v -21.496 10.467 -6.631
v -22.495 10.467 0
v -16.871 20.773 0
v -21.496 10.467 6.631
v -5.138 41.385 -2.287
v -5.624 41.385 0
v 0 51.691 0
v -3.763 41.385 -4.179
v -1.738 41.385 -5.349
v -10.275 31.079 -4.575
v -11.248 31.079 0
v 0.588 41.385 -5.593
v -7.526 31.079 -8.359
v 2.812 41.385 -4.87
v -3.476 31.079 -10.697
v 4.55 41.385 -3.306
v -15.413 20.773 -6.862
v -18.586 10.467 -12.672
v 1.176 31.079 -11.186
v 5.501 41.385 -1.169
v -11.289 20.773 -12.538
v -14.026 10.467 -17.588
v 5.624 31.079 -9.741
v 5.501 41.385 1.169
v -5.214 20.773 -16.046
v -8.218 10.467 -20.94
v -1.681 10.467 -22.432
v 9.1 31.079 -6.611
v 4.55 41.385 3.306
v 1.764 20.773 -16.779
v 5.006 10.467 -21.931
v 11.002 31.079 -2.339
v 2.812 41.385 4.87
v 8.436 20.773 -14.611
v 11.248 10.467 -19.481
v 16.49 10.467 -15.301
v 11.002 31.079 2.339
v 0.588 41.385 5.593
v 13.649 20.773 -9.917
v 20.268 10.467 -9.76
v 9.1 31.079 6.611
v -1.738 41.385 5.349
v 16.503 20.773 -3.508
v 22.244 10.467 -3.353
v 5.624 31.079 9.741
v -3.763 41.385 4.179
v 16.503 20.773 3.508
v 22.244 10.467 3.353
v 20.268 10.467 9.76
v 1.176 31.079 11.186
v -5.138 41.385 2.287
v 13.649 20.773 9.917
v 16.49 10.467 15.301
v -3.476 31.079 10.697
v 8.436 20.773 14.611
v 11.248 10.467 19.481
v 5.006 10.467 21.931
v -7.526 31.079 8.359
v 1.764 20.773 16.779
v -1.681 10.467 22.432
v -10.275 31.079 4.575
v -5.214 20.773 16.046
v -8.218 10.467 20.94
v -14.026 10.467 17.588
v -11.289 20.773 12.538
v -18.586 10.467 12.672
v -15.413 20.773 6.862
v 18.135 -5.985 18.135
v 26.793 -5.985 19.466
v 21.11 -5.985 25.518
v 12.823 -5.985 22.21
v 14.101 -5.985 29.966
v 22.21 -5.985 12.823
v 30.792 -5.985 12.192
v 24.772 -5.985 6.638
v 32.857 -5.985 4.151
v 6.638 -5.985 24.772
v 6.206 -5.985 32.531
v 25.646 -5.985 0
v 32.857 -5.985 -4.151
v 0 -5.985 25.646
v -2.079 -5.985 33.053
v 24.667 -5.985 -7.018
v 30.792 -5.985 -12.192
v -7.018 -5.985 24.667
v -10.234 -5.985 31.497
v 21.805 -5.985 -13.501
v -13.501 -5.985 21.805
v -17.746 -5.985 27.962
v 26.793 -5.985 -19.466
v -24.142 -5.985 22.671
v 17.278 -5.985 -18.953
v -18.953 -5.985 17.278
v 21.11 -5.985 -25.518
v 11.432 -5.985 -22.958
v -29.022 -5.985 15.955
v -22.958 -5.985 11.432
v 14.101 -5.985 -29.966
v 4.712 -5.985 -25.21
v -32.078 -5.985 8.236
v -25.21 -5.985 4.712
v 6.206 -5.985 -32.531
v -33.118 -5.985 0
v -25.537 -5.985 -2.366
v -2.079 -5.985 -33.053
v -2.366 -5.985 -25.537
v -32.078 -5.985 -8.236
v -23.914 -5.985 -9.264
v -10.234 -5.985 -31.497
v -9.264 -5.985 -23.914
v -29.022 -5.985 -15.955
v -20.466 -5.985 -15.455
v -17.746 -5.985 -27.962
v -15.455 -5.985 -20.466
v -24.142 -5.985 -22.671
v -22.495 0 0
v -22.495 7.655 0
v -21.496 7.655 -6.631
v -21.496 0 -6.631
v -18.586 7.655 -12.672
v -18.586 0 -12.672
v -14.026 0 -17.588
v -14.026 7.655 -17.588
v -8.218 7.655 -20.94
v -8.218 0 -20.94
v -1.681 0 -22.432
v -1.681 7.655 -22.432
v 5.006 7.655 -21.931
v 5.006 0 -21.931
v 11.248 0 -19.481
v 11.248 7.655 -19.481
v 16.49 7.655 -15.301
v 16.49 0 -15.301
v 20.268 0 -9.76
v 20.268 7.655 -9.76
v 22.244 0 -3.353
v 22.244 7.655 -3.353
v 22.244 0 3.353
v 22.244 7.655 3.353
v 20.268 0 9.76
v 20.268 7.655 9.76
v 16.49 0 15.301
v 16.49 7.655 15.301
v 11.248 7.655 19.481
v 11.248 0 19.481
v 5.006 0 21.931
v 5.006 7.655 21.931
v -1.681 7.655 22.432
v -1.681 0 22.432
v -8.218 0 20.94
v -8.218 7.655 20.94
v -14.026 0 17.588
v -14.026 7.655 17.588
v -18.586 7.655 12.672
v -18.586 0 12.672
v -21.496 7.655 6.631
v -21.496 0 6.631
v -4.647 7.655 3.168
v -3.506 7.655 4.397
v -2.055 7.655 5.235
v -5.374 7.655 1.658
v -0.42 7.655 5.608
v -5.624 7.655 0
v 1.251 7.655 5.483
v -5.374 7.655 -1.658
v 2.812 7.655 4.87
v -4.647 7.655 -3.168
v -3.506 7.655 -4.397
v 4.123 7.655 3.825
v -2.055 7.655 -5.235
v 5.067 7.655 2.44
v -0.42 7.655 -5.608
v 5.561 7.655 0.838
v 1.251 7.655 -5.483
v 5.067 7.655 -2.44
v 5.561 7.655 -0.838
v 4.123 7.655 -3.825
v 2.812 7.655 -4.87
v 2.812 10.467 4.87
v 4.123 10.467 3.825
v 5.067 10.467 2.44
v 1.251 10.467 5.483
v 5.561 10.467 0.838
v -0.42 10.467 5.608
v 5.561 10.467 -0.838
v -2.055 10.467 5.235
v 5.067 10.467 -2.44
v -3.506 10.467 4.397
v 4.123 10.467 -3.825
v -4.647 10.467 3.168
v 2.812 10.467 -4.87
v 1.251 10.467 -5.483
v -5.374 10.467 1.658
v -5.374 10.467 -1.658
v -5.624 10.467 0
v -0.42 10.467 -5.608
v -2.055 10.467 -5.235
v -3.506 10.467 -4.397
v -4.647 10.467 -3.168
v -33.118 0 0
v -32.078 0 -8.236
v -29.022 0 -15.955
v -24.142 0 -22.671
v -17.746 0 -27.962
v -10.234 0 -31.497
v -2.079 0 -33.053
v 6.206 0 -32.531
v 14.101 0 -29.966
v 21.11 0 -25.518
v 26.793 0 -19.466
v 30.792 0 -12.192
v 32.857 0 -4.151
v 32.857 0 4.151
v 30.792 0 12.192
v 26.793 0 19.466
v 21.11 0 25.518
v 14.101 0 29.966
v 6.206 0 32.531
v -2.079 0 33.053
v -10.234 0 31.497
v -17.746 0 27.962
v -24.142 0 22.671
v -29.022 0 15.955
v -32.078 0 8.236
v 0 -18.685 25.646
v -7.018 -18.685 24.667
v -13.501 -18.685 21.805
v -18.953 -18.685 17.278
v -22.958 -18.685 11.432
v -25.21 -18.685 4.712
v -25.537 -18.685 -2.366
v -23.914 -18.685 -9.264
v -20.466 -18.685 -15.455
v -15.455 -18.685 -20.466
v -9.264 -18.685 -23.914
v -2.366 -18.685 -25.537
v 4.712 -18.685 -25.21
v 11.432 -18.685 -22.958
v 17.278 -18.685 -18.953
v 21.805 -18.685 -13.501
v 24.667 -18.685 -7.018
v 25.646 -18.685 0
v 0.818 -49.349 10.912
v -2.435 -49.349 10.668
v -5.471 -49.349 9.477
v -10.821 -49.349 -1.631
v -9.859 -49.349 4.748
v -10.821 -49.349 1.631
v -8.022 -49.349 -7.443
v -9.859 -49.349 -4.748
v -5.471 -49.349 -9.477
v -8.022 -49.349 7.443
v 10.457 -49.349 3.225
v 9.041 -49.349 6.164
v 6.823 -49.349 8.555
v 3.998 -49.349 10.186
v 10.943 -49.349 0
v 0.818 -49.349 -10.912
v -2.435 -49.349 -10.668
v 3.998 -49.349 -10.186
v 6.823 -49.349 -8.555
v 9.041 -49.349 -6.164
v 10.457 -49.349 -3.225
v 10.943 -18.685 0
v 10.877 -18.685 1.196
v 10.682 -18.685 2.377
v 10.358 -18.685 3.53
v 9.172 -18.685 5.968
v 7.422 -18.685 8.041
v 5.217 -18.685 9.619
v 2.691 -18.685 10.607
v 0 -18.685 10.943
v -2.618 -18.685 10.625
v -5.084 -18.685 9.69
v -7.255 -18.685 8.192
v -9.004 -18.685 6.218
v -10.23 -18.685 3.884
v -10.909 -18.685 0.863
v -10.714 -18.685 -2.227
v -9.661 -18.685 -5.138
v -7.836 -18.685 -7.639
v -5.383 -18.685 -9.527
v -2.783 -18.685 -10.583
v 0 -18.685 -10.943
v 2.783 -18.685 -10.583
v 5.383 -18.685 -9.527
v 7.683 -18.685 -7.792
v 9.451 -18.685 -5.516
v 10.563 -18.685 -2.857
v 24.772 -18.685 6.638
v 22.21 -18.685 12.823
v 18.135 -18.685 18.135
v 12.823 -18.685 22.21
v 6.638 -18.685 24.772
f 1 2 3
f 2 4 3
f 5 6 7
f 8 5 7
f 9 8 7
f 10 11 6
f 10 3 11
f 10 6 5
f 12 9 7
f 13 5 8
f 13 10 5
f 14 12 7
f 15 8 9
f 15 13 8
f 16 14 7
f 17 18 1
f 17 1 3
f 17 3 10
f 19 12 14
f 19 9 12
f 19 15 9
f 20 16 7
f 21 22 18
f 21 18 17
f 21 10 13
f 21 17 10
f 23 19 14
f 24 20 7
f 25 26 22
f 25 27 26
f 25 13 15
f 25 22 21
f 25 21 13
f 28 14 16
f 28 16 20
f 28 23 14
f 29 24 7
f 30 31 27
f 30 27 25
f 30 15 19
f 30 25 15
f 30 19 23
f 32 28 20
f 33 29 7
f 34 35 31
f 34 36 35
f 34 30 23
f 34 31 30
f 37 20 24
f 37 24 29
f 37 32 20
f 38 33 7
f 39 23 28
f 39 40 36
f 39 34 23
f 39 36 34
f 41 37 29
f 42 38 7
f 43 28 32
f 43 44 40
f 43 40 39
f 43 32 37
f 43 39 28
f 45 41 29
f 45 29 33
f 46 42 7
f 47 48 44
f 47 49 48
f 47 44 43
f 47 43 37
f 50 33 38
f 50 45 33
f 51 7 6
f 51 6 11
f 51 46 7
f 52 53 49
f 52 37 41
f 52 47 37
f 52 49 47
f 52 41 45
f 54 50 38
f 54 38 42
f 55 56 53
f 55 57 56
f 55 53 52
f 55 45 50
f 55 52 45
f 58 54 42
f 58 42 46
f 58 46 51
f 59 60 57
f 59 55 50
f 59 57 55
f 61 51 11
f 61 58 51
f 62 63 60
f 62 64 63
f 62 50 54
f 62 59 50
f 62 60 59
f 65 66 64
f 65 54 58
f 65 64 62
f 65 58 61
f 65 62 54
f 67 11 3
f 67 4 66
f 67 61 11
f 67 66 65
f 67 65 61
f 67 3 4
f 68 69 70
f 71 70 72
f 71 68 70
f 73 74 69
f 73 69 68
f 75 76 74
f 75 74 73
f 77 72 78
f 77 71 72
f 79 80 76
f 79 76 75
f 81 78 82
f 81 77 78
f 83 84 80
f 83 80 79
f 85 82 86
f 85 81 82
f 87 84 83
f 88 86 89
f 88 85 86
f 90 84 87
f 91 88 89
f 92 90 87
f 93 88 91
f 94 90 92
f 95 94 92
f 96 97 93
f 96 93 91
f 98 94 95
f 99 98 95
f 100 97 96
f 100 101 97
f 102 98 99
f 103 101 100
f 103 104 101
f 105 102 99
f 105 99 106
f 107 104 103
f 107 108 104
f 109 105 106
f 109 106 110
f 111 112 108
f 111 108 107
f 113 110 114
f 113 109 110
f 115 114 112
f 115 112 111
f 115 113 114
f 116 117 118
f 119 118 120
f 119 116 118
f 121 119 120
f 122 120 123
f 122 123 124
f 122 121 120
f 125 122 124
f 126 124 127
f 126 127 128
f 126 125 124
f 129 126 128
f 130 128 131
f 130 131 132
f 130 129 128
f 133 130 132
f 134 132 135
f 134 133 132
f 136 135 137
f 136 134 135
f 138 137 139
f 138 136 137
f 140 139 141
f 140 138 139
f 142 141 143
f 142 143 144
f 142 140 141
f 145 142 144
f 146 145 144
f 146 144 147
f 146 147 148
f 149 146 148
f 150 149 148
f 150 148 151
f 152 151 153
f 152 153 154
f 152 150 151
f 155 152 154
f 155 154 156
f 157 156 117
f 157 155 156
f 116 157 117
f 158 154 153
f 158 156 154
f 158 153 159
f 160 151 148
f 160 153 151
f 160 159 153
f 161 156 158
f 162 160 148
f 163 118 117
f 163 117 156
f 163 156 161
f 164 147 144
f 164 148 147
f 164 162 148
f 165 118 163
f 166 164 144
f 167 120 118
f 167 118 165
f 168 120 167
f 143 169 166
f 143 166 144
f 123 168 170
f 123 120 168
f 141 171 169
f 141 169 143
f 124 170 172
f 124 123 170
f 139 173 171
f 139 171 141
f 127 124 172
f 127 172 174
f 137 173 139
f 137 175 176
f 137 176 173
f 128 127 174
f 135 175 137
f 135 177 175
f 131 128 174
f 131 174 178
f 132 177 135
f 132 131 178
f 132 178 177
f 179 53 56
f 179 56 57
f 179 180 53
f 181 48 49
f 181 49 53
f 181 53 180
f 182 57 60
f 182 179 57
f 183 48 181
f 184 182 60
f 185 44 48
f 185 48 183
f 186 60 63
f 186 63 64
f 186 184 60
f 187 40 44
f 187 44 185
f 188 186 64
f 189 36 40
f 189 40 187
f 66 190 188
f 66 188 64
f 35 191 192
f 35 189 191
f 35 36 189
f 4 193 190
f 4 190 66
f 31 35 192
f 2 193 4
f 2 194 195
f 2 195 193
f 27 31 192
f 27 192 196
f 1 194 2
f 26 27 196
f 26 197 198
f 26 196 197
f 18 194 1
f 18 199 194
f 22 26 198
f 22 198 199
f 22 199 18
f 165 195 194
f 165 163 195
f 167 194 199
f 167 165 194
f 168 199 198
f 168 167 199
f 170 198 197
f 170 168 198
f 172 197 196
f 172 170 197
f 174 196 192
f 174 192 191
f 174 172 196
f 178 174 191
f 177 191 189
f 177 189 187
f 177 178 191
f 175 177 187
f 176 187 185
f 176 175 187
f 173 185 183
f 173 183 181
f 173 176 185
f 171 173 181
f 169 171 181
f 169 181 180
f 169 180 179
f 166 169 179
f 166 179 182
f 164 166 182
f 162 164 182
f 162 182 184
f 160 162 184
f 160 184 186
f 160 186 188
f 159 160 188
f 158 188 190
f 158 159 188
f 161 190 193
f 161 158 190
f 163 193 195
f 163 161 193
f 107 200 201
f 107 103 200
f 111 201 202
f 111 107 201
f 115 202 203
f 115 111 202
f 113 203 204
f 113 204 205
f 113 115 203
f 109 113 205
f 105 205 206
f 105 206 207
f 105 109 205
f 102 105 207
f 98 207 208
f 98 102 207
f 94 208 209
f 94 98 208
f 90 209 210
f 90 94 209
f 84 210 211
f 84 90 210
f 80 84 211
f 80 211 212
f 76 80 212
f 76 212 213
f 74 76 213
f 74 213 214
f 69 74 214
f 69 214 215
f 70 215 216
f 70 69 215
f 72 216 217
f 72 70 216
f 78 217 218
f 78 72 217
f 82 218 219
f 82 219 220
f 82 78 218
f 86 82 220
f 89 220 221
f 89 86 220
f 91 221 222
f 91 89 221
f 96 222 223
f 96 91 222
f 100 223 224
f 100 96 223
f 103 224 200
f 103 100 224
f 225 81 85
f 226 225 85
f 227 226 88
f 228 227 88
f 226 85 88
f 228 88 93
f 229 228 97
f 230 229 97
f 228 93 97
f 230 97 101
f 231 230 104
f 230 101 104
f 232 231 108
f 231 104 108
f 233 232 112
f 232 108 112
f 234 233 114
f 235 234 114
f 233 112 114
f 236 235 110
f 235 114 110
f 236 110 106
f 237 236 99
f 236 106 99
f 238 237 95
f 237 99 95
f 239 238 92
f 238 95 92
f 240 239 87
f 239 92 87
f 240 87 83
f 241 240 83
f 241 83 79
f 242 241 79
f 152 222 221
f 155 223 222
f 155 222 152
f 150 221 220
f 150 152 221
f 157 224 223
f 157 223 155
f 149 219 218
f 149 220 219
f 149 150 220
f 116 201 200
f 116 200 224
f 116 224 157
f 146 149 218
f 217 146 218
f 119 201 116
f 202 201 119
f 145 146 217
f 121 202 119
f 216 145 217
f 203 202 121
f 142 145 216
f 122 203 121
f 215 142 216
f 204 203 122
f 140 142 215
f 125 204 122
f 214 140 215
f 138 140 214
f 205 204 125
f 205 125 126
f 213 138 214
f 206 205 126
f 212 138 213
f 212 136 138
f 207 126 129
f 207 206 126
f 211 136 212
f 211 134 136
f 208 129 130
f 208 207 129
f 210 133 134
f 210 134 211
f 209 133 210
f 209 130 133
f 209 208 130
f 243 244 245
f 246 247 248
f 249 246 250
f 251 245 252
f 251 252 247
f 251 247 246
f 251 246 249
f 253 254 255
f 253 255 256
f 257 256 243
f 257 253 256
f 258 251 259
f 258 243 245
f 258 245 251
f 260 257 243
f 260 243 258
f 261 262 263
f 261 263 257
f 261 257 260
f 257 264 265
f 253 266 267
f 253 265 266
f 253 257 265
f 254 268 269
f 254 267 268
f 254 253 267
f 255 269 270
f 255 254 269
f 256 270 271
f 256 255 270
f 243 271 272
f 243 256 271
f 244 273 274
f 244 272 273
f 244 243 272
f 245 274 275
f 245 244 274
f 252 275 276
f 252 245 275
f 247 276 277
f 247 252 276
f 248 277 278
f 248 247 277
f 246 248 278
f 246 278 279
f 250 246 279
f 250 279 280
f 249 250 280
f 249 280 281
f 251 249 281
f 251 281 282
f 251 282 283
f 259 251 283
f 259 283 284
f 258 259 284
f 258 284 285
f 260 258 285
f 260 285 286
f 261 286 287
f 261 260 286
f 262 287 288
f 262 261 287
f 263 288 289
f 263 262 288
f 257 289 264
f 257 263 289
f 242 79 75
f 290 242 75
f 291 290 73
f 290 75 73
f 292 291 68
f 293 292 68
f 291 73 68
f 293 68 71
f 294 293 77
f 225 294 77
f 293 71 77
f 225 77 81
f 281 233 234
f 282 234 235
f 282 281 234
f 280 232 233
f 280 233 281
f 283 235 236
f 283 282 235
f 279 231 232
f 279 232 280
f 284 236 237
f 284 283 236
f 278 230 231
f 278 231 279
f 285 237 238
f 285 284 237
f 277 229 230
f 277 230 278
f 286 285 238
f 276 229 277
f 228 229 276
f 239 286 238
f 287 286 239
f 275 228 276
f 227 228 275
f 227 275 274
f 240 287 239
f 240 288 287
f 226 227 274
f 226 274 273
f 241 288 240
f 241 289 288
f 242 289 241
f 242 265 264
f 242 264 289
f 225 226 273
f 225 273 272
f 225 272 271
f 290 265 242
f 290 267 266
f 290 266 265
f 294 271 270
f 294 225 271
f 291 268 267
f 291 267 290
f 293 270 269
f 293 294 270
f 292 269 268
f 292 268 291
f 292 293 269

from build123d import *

# Parameters (mm, degrees)
F2_R     = 10.9427513267
F6_DEPTH = 12.7


# Not quite as in the source:
# - a feature of the source that left no trace in its solid (it failed there, or was rolled back) is left out


with BuildPart() as f1:
    # F0 (on Top) → F1 (revolve)
    with BuildSketch(Plane.XY):
        Polygon((-22.4952585995, 7.654638961), (-22.4952585995, 0), (0, 0), (0, 51.6905076802), (-22.4952585995, 10.4665467516), (-5.6238141842, 10.4665467516), (-5.6238141842, 7.654638961), align=None)
        Polygon((-22.4952585995, 0), (-33.1180207431, 0), (-33.1180207431, -5.9848567471), (0, -5.9848567471), (0, 0), align=None)
    revolve(axis=Axis((0, -2.9924283735, 0), (0, -1, 0)))

    # F4: sweep along a path in F3
    with BuildLine(Plane.XY) as f4_path:
        Line((0, -6.7567974329), (0, -50.1213520765))
    # F2 (on face) → F4 (sweep)
    with BuildSketch(Plane.XZ.offset(5.9848567471)):
        Circle(F2_R)
    sweep(path=f4_path.line)

    # F5 (on face) → F6 (join)
    with BuildSketch(Plane.XZ.offset(5.9848567471)):
        with BuildLine():
            ThreePointArc((0, 25.6462656645), (-18.1346483635, -18.1346483635), (25.6462656645, 0))
            ThreePointArc((25.6462656645, 0), (18.1346483635, 18.1346483635), (0, 25.6462656645))
        make_face()
        with BuildLine():
            ThreePointArc((-10.2304533567, 3.8835075273), (-6.214802871, 9.0066659687), (0, 10.9427513267))
            ThreePointArc((0, 10.9427513267), (6.3686758751, 8.8985265182), (10.3578760896, 3.5296188901))
            ThreePointArc((10.3578760896, 3.5296188901), (10.7955423421, 1.7888745451), (10.9427513267, 0))
            ThreePointArc((10.9427513267, 0), (9.4510721789, -5.5155272882), (5.3827161292, -9.5273382259))
            ThreePointArc((5.3827161292, -9.5273382259), (0, -10.9427513267), (-5.3827161292, -9.5273382259))
            ThreePointArc((-5.3827161292, -9.5273382259), (-10.2910379118, -3.7199926472), (-10.2304533567, 3.8835075273))
        make_face(mode=Mode.SUBTRACT)
    extrude(amount=F6_DEPTH)


solid = f1.part
